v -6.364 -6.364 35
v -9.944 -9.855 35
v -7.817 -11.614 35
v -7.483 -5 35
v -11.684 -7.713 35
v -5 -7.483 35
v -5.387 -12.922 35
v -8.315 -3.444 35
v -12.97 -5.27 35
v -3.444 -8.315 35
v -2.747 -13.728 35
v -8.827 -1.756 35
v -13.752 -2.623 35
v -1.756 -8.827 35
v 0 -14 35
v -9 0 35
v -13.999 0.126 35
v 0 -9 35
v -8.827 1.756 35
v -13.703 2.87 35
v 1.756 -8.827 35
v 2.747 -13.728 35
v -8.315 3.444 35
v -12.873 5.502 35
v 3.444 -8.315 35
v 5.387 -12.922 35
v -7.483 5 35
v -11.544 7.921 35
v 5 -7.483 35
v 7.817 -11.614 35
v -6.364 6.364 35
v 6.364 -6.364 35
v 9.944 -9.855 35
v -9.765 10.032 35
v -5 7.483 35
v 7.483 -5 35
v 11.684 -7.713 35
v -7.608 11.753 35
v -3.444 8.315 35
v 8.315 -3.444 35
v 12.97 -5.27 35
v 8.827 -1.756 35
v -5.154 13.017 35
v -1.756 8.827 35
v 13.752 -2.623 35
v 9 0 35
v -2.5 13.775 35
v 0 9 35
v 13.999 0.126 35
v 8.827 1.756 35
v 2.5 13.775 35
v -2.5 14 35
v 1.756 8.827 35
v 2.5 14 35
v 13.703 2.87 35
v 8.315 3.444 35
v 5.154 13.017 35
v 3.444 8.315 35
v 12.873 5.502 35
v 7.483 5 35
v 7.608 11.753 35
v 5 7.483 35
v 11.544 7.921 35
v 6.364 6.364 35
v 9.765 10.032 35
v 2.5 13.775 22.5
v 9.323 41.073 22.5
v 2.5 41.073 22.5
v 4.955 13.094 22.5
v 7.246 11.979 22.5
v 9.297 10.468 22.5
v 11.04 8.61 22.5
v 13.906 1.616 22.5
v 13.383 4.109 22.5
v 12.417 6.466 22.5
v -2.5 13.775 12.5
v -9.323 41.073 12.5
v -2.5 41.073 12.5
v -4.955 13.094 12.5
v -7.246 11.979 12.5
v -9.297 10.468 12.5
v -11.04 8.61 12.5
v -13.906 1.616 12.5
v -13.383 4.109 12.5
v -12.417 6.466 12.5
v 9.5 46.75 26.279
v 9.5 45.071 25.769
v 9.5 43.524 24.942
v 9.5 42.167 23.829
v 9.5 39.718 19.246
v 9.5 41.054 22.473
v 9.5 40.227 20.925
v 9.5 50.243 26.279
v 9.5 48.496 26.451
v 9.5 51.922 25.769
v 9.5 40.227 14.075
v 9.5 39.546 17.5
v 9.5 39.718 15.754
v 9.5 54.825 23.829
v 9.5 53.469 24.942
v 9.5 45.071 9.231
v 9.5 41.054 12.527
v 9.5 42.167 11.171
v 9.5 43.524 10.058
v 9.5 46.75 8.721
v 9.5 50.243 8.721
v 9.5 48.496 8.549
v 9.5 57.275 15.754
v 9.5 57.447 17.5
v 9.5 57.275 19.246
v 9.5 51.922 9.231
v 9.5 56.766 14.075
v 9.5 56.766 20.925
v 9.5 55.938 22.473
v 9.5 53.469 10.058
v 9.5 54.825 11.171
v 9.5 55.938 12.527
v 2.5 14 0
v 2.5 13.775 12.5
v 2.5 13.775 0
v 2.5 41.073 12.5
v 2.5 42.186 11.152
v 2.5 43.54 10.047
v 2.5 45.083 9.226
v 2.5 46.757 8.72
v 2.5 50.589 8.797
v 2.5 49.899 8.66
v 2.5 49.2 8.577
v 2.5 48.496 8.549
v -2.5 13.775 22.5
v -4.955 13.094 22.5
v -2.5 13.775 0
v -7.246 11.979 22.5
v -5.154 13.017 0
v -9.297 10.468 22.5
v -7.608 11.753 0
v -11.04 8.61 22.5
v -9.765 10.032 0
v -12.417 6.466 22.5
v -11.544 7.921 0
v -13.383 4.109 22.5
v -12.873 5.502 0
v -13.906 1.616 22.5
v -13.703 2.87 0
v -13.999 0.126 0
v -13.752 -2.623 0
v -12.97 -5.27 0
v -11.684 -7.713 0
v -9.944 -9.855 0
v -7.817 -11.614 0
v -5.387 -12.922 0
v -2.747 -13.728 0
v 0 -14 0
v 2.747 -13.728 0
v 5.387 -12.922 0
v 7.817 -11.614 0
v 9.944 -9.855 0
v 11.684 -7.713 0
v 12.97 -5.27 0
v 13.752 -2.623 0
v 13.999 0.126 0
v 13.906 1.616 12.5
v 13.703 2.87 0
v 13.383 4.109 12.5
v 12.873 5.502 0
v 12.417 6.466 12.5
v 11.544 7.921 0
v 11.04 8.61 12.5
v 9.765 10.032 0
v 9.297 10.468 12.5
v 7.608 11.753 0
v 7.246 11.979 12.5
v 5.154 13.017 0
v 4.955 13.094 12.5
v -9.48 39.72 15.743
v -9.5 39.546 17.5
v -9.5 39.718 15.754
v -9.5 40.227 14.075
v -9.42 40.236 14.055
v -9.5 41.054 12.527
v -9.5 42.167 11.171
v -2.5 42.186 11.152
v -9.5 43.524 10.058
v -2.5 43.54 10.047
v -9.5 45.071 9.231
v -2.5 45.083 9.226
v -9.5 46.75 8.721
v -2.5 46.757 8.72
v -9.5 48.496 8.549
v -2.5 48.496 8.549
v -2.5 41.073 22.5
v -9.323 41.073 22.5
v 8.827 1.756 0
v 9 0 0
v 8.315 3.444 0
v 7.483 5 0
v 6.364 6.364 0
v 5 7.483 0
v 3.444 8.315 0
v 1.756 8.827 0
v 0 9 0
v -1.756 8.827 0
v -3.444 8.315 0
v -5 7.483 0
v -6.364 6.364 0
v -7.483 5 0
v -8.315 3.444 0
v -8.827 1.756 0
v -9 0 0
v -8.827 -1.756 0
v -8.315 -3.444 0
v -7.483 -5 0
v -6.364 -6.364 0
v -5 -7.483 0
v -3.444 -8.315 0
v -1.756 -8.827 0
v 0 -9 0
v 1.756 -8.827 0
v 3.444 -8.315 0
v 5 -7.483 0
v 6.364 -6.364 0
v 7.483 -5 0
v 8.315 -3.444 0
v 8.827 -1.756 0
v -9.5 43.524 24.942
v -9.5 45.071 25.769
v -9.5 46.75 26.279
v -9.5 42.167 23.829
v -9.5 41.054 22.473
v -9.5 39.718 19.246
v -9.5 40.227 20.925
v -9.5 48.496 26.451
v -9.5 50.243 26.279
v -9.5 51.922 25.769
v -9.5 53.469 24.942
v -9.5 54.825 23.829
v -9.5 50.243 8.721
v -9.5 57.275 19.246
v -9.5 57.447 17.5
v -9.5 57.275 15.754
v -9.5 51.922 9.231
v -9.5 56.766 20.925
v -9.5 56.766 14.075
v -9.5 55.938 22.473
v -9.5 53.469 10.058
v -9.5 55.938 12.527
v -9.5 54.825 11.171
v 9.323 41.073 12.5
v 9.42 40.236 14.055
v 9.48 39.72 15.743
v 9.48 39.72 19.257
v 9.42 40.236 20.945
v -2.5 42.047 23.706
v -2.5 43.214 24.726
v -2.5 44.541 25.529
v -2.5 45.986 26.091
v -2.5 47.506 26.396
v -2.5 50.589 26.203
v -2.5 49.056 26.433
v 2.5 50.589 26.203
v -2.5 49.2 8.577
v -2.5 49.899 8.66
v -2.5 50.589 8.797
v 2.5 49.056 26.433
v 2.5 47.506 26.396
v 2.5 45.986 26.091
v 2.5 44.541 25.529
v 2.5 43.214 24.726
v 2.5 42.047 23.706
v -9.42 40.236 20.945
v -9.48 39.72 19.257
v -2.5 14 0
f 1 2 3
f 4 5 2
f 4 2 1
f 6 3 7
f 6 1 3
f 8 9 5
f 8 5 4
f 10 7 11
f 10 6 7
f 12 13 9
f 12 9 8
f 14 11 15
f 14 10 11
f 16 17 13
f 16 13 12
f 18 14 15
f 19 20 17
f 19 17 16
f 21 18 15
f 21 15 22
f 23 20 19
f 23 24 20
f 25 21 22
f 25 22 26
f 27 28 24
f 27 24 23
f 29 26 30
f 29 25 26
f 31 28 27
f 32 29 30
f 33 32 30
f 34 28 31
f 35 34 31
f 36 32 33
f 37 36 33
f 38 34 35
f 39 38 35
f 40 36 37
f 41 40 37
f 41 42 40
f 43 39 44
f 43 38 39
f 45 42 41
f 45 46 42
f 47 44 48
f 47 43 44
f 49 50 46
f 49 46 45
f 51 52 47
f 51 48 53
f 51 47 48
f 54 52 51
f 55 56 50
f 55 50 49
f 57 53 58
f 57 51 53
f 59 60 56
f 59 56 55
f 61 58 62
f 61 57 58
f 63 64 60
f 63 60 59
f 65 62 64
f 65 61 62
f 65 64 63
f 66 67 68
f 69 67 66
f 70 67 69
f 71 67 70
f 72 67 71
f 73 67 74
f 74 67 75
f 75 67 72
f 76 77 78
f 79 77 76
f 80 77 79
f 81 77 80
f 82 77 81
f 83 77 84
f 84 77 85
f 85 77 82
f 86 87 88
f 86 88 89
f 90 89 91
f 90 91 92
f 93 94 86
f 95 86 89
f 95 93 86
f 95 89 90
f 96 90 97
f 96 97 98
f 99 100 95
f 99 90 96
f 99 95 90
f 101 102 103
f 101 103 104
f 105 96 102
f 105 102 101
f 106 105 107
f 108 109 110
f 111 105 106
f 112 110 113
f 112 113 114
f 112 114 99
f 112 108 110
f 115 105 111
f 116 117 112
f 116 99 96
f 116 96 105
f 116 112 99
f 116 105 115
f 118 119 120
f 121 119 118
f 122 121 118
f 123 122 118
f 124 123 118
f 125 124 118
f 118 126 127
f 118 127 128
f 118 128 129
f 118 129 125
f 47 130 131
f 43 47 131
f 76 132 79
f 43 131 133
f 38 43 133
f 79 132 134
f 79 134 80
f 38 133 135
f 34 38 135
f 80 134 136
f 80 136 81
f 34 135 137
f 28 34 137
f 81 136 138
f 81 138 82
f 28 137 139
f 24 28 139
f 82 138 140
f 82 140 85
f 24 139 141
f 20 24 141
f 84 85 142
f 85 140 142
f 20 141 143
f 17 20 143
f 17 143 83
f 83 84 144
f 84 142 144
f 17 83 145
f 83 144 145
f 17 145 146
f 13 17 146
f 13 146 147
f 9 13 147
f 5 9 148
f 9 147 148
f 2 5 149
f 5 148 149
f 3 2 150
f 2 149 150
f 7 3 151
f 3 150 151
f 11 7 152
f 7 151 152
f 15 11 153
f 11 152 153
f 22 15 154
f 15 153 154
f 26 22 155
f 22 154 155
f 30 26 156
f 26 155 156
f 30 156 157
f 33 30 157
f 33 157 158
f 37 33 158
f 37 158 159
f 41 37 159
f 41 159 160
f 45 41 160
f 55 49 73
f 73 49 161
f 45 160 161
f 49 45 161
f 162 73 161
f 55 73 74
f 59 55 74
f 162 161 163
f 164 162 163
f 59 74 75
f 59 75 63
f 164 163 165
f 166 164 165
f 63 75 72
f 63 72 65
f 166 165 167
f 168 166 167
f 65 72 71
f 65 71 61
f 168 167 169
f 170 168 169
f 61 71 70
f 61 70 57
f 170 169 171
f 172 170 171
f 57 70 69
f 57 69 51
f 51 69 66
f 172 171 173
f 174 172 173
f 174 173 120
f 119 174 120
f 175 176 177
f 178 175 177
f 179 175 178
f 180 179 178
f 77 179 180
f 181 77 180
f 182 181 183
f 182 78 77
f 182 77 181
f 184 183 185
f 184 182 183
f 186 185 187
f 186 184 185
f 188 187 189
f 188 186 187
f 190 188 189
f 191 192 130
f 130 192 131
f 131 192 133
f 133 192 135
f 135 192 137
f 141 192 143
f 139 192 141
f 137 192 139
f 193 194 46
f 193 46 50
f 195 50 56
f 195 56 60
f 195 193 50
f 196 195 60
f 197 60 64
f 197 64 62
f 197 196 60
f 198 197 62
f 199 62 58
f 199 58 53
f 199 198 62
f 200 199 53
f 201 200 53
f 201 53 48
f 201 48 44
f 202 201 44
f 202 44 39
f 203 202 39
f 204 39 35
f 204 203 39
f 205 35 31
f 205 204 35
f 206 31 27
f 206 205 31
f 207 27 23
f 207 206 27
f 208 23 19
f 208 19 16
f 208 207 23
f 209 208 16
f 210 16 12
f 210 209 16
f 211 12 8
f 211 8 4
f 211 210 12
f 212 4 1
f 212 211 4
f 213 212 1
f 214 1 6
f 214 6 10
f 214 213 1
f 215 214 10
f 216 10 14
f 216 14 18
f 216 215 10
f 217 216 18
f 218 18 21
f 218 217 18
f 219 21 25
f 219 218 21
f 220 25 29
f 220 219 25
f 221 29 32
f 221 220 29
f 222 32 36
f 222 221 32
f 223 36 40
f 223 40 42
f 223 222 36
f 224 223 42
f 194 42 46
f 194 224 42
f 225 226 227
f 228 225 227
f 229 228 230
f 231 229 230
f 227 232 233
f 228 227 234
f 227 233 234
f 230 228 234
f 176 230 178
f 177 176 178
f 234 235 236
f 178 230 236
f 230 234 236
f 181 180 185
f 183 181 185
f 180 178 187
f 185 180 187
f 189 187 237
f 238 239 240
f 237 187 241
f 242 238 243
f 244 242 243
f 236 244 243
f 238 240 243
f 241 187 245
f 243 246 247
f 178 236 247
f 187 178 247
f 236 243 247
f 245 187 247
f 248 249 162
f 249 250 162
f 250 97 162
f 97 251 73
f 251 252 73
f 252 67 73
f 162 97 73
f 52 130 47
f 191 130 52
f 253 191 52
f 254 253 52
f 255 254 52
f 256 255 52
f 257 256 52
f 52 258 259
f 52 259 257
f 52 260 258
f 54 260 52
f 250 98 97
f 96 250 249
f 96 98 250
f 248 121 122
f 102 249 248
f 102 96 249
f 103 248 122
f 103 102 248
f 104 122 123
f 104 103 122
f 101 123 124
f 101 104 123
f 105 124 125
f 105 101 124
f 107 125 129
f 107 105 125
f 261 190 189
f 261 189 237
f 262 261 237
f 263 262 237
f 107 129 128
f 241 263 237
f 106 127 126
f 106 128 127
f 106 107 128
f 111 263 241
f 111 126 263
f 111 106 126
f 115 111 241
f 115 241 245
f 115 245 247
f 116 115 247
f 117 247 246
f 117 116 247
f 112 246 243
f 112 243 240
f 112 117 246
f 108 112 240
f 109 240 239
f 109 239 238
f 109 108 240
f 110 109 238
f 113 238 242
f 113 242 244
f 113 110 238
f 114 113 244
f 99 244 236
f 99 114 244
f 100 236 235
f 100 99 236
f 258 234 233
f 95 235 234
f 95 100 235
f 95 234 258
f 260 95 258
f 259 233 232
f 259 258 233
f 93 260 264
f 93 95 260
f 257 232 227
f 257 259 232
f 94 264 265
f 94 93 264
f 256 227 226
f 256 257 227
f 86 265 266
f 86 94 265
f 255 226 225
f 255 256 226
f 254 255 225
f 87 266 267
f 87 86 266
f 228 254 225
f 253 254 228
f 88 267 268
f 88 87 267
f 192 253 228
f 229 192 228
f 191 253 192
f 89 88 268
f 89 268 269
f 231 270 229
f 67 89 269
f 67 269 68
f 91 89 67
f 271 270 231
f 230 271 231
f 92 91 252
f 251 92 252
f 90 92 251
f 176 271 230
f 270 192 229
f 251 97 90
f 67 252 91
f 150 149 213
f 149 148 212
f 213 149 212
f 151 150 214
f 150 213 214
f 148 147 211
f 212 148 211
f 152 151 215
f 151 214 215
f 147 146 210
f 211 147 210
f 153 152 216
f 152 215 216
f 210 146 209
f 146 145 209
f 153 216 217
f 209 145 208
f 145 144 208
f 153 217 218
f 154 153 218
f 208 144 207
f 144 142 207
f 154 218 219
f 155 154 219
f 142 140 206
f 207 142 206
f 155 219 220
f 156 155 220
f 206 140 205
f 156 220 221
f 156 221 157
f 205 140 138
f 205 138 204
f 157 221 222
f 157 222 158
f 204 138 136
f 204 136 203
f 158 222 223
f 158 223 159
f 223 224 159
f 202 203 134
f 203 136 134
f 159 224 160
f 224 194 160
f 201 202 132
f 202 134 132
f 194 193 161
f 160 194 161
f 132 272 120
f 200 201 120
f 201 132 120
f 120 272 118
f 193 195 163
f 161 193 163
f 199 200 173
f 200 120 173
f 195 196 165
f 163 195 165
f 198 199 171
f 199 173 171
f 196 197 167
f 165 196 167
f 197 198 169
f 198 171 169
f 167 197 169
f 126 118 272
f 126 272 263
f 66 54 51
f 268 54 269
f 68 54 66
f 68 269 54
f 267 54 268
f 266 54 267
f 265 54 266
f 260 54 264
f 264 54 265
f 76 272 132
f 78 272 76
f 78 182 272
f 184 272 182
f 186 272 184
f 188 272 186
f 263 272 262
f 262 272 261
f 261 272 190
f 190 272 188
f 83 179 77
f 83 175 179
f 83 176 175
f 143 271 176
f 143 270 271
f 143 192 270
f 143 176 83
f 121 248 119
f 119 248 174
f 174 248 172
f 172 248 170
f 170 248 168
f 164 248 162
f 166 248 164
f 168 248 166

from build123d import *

# Parameters (mm, degrees)
SKETCH1_R           = 14
SKETCH1_R_2         = 9
BOSS_EXTRUDE1_DEPTH = 35
SKETCH3_R           = 8.950574332
BOSS_EXTRUDE2_DEPTH = 9.5
BOSS_EXTRUDE3_DEPTH = 2.5
SKETCH7_W           = 5
SKETCH7_H           = 35
BOSS_EXTRUDE5_DEPTH = 0.225023
RIB12_REACH         = 63.664
SKETCH6_WALL_W      = 163.51256394
SKETCH6_WALL_H      = 10


with BuildPart() as part:
    # Sketch1 → Boss-Extrude1 (new body)
    with BuildSketch(Plane.XY):
        Circle(SKETCH1_R)
        Circle(SKETCH1_R_2, mode=Mode.SUBTRACT)
    extrude(amount=BOSS_EXTRUDE1_DEPTH)



with BuildPart() as body_2:
    # Sketch3 → Boss-Extrude2 (new, symmetric)
    with BuildSketch(Plane(origin=(0, 0, 0), x_dir=(0, 0, -1), z_dir=(1, 0, 0))):
        with Locations((-17.5, 48.496368985)):
            Circle(SKETCH3_R)
    extrude(amount=BOSS_EXTRUDE2_DEPTH, both=True)

    # Sketch3<3> → Boss-Extrude3 (add, symmetric)
    with BuildSketch(Plane(origin=(0, 0, 0), x_dir=(0, 0, -1), z_dir=(1, 0, 0))):
        with BuildLine():
            Line((-26.202553454, 50.588818327), (-35, 14))
            Line((-35, 14), (0, 14))
            Line((0, 14), (-8.797446546, 50.588818327))
            ThreePointArc((-8.797446546, 50.588818327), (-8.61164716, 49.549917585), (-8.549425668, 48.496368985))
            ThreePointArc((-8.549425668, 48.496368985), (-18.553548599, 39.608016145), (-26.202553454, 50.588818327))
        make_face()
    extrude(amount=BOSS_EXTRUDE3_DEPTH, both=True)


with BuildPart() as part_1:
    add(part.part)

    add(body_2.part)  # Boss-Extrude5 merges body 2
    # Sketch7 → Boss-Extrude5 (add)
    with BuildSketch(Plane.XZ.offset(-14)):
        with Locations((0, 17.5)):
            Rectangle(SKETCH7_W, SKETCH7_H)
    extrude(amount=BOSS_EXTRUDE5_DEPTH)

    # Sketch6 wall → Rib12 (add, up to next)
    with BuildSketch(Plane(origin=(11.703236177, 20.580676171, 17.5), x_dir=(0.115396977809, -0.993319453908, 0), z_dir=(-0.993319453908, -0.115396977809, 0)), mode=Mode.PRIVATE) as rib12_sk1:
        Rectangle(SKETCH6_WALL_W, SKETCH6_WALL_H)
    rib12_tool1 = extrude(rib12_sk1.sketch, amount=RIB12_REACH, mode=Mode.PRIVATE) - part_1.part
    rib12 = rib12_tool1.solids().sort_by_distance((11.703236177, 20.580676171, 17.5))[0]
    add(rib12)

    # Mirror1: Rib12 across plane
    add(rib12.mirror(Plane(origin=(0, 0, 0), x_dir=(0, 0, 1), z_dir=(1, 0, 0))))


solid = part_1.part
